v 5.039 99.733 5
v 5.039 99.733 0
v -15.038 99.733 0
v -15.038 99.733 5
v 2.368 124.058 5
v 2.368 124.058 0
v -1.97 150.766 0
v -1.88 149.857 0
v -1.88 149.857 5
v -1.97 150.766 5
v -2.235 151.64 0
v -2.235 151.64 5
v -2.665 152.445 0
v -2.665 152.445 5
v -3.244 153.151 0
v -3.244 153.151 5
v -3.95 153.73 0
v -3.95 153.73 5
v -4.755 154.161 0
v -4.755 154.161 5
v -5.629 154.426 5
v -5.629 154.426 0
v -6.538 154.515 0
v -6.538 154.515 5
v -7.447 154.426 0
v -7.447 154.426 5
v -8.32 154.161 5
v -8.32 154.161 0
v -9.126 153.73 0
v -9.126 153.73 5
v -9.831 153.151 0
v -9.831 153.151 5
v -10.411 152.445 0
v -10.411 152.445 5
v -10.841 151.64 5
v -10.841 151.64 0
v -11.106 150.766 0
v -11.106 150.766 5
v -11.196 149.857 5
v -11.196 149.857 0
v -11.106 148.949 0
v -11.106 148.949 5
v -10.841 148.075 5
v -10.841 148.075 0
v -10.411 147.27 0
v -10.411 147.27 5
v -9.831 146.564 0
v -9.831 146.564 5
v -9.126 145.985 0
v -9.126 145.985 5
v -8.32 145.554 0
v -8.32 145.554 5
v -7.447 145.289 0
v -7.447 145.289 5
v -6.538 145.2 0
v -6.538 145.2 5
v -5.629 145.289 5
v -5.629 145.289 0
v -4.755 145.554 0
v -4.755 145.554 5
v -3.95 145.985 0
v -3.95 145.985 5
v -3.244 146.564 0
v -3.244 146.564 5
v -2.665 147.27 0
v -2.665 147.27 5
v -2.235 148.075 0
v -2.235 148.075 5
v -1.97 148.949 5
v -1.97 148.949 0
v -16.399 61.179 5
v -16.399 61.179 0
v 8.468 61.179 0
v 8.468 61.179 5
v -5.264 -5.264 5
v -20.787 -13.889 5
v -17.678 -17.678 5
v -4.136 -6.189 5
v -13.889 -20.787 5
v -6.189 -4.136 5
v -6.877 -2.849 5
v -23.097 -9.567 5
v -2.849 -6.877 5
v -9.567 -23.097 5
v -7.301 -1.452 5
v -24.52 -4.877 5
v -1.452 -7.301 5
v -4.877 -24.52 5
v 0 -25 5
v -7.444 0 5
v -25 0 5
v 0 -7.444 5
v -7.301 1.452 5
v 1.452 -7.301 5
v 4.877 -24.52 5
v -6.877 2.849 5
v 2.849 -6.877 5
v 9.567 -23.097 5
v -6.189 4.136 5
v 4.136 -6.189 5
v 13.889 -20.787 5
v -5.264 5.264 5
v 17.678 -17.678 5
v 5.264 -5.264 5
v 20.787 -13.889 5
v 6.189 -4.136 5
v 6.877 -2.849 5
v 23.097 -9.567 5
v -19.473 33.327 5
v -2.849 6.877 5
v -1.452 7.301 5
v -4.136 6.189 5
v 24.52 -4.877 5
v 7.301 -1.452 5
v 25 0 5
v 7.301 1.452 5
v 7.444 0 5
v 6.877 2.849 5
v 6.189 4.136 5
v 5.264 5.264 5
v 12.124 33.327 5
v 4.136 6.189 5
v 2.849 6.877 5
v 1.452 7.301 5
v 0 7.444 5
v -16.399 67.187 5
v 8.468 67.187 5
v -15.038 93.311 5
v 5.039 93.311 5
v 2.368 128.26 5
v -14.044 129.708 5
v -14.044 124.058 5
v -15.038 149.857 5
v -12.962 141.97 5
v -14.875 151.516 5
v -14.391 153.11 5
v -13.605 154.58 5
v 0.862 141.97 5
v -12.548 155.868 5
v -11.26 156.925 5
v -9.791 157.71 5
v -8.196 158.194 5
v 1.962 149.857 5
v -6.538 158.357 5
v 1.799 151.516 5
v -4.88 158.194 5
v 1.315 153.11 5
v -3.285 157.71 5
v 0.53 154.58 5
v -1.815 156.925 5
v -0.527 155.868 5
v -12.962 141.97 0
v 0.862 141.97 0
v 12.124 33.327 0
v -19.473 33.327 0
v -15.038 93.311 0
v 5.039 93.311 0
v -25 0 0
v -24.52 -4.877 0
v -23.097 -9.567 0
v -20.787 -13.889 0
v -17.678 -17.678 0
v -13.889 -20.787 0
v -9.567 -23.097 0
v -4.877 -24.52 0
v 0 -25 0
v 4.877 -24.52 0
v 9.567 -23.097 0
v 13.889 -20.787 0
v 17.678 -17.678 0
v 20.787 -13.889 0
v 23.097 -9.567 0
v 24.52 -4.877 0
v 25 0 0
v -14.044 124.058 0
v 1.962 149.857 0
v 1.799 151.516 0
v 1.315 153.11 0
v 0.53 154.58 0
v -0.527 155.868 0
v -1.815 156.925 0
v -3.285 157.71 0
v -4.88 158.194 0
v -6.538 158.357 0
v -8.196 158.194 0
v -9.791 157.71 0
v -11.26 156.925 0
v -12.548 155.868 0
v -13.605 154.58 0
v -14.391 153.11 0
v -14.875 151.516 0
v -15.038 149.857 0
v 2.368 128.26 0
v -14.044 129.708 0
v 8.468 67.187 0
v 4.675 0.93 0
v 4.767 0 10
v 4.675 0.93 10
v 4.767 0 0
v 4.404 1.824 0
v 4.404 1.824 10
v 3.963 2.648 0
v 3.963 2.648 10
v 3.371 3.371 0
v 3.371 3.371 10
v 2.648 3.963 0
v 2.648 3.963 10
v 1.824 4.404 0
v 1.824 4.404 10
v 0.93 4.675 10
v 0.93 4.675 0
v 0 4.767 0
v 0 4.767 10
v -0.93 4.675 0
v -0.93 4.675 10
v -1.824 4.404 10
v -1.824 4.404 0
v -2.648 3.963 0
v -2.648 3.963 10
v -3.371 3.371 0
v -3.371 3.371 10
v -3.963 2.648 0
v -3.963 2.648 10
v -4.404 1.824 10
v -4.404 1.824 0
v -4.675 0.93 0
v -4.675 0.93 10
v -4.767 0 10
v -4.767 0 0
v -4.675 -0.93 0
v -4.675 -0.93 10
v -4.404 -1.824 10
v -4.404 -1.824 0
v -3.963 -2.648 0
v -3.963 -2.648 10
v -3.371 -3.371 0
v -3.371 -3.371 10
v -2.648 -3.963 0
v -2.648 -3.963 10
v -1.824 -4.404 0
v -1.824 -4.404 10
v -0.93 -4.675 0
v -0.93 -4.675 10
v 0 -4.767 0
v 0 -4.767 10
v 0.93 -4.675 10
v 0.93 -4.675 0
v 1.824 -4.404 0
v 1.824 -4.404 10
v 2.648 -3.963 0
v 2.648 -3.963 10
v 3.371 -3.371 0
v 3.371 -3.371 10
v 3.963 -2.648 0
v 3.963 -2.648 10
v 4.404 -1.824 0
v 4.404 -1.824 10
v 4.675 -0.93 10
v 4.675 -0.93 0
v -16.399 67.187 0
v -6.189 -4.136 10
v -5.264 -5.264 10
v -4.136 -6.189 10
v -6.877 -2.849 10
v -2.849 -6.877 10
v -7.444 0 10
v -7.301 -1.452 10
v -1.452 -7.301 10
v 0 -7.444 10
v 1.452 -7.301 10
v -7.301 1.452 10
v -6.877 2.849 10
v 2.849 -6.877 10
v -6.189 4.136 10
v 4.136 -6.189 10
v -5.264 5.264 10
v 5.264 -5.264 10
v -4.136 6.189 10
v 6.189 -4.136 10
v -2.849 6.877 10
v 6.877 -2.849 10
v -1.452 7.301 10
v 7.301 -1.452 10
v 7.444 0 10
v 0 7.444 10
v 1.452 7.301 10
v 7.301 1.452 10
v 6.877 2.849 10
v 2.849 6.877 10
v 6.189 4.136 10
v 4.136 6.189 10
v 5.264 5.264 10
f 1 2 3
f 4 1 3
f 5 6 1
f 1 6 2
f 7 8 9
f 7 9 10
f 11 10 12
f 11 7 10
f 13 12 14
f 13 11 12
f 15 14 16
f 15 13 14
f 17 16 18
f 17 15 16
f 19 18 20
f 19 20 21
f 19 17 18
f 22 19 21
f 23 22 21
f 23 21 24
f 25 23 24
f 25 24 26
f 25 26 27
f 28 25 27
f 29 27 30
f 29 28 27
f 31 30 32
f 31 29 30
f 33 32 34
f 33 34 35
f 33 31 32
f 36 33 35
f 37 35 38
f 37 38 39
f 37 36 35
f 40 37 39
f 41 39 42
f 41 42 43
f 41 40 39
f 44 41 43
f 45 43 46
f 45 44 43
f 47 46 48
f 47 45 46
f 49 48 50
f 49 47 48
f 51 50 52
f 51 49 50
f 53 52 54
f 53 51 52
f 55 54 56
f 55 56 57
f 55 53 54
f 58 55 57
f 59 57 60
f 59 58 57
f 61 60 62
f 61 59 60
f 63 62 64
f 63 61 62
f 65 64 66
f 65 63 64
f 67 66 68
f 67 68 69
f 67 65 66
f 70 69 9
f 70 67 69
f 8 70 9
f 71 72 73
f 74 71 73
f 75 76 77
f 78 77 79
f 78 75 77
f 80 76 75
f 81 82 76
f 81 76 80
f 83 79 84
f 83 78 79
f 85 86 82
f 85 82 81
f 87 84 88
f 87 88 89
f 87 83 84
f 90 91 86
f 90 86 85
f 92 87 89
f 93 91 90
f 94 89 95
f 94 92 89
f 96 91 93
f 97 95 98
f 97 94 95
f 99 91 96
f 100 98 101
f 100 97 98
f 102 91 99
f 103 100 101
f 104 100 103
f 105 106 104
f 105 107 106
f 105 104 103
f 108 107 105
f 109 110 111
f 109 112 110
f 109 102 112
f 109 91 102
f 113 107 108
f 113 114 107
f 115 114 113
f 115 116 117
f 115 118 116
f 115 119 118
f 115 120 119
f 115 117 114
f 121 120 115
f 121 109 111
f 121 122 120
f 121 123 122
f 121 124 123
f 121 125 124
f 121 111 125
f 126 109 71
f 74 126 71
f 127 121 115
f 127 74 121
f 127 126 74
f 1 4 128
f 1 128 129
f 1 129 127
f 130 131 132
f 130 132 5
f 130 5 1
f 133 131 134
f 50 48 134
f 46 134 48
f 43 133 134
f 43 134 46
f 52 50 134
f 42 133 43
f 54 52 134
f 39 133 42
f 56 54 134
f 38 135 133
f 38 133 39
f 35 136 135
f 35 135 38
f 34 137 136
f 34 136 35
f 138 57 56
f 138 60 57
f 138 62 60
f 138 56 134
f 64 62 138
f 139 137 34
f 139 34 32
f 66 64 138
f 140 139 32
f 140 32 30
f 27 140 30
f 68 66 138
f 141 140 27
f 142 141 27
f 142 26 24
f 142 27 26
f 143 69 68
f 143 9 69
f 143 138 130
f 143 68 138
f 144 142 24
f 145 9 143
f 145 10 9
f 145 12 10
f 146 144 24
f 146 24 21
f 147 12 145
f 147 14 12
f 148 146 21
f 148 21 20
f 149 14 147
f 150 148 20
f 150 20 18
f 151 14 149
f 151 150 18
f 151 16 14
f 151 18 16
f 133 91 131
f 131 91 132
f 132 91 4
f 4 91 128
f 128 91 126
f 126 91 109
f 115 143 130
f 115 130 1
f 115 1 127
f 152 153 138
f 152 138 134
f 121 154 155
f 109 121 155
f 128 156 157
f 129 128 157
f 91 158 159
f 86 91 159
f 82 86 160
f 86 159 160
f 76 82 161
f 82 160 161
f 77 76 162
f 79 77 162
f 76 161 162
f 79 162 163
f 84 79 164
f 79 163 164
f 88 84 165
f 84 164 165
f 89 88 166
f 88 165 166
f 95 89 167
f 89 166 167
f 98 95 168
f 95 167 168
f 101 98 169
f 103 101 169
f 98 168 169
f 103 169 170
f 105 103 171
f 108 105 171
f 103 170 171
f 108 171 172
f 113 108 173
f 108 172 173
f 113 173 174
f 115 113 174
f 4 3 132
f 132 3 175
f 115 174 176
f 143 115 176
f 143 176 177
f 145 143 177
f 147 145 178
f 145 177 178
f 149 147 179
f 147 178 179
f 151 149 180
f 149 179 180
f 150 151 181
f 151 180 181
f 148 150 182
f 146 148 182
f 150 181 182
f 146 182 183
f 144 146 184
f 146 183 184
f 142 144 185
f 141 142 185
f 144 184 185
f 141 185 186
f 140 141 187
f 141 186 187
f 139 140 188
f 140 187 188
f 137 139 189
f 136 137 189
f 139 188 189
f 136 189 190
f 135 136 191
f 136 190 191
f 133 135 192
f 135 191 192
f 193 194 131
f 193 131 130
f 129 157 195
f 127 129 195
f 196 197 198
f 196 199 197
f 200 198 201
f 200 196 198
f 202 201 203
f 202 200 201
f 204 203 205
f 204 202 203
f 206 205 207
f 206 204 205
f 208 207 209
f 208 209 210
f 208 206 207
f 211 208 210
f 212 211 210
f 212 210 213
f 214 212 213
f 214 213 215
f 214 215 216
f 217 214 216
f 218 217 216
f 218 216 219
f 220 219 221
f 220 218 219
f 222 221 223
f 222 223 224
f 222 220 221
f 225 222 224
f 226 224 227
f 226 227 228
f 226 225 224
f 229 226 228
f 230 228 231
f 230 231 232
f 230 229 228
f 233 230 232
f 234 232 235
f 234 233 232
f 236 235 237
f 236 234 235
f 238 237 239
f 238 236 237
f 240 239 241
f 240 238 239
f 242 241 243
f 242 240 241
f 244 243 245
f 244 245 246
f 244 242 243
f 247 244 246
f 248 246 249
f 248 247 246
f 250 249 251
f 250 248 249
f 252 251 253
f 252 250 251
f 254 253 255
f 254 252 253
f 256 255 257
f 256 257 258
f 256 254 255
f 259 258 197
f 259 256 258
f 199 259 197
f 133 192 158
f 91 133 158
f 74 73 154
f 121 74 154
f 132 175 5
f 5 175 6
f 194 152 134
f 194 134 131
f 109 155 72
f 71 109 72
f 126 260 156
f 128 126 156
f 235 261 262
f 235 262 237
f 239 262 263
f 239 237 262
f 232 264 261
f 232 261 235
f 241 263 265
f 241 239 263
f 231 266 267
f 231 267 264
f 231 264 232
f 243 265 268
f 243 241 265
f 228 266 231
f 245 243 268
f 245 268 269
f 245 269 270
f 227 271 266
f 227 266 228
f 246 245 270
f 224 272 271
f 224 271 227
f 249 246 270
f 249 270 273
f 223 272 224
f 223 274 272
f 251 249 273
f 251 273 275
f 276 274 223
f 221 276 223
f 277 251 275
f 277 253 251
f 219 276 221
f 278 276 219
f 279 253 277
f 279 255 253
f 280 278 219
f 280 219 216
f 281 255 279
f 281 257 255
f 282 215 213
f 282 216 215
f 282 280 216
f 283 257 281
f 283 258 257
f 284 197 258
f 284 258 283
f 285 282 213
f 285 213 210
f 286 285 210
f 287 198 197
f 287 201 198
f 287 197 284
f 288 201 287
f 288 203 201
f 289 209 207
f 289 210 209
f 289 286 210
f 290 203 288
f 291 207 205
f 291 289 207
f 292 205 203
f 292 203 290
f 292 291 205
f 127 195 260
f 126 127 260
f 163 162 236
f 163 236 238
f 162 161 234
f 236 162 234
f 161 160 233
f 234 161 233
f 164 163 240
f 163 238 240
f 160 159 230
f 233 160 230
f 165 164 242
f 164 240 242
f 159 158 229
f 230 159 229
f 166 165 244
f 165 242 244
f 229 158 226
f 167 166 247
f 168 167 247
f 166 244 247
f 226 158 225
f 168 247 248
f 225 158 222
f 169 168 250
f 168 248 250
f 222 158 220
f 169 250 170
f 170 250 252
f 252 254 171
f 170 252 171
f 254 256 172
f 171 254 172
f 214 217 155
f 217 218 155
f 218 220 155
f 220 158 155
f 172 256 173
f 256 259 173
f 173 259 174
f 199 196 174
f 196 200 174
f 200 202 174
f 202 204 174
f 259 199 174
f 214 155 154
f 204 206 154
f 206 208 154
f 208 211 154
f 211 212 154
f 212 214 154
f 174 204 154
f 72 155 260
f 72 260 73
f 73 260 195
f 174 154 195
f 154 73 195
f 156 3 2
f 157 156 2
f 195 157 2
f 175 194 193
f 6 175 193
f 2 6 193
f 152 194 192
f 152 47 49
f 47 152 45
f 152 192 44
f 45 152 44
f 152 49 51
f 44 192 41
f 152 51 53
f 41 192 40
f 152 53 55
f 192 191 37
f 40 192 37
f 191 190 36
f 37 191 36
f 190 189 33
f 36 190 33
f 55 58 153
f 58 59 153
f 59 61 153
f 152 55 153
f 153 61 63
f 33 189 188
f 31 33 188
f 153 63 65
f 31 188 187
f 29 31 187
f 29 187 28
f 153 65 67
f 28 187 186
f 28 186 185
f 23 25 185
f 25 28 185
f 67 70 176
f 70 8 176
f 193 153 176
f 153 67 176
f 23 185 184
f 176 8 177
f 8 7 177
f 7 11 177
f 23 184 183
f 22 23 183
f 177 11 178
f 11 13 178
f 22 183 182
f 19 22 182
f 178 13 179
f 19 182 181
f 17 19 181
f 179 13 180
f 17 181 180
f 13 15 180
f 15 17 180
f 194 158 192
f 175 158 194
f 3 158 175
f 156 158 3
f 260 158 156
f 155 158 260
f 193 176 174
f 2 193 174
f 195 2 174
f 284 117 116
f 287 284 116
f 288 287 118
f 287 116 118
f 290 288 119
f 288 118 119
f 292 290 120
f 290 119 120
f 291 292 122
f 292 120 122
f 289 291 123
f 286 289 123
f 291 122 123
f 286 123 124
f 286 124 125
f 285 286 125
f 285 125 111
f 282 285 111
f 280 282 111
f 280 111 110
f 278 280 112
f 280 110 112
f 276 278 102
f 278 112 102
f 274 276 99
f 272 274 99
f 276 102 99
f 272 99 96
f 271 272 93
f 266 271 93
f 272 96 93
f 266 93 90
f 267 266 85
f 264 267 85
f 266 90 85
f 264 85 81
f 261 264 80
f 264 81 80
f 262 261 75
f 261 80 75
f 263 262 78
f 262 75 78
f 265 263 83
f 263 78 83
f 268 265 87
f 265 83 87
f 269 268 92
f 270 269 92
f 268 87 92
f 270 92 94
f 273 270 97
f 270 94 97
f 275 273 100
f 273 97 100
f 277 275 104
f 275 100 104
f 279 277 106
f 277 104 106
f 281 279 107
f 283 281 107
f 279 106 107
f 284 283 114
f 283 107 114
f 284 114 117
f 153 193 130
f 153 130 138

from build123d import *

# Parameters (mm, degrees)
SKETCH2_R           = 4.766632538
SKETCH2_R_2         = 4.65778258
BOSS_EXTRUDE1_DEPTH = 5
SKETCH3_R           = 7.443841037
SKETCH3_R_2         = 4.766632538
BOSS_EXTRUDE2_DEPTH = 5


with BuildPart() as part:
    # Sketch2 → Boss-Extrude1 (new body)
    with BuildSketch(Plane.XY):
        with BuildLine():
            Line((-15.037844772, 149.857454221), (-25, 0))
            ThreePointArc((-25, 0), (0, -25), (25, 0))
            Line((25, 0), (1.962155228, 149.857454221))
            ThreePointArc((1.962155228, 149.857454221), (-6.537844772, 158.357454221), (-15.037844772, 149.857454221))
        make_face()
        Circle(SKETCH2_R, mode=Mode.SUBTRACT)
        with Locations((-6.537844772, 149.857454221)):
            Circle(SKETCH2_R_2, mode=Mode.SUBTRACT)
        Polygon((-19.47250371, 33.326803339), (-16.399054011, 61.179494137), (8.4679481, 61.179494137), (12.123565561, 33.326803339), align=None, mode=Mode.SUBTRACT)
        Polygon((-16.399054011, 67.186691276), (-15.037844772, 93.311013718), (5.039175994, 93.311013718), (8.4679481, 67.186691276), align=None, mode=Mode.SUBTRACT)
        Polygon((-15.037844772, 99.732600208), (-14.044403658, 124.0583194), (2.367565215, 124.0583194), (5.039175994, 99.732600208), align=None, mode=Mode.SUBTRACT)
        Polygon((-12.962496523, 141.96989308), (-14.044403658, 129.708278883), (2.367565215, 128.260163982), (0.861872424, 141.96989308), align=None, mode=Mode.SUBTRACT)
    extrude(amount=BOSS_EXTRUDE1_DEPTH)

    # Sketch3 → Boss-Extrude2 (add)
    with BuildSketch(Plane.XY.offset(5)):
        Circle(SKETCH3_R)
        Circle(SKETCH3_R_2, mode=Mode.SUBTRACT)
    extrude(amount=BOSS_EXTRUDE2_DEPTH)


solid = part.part
